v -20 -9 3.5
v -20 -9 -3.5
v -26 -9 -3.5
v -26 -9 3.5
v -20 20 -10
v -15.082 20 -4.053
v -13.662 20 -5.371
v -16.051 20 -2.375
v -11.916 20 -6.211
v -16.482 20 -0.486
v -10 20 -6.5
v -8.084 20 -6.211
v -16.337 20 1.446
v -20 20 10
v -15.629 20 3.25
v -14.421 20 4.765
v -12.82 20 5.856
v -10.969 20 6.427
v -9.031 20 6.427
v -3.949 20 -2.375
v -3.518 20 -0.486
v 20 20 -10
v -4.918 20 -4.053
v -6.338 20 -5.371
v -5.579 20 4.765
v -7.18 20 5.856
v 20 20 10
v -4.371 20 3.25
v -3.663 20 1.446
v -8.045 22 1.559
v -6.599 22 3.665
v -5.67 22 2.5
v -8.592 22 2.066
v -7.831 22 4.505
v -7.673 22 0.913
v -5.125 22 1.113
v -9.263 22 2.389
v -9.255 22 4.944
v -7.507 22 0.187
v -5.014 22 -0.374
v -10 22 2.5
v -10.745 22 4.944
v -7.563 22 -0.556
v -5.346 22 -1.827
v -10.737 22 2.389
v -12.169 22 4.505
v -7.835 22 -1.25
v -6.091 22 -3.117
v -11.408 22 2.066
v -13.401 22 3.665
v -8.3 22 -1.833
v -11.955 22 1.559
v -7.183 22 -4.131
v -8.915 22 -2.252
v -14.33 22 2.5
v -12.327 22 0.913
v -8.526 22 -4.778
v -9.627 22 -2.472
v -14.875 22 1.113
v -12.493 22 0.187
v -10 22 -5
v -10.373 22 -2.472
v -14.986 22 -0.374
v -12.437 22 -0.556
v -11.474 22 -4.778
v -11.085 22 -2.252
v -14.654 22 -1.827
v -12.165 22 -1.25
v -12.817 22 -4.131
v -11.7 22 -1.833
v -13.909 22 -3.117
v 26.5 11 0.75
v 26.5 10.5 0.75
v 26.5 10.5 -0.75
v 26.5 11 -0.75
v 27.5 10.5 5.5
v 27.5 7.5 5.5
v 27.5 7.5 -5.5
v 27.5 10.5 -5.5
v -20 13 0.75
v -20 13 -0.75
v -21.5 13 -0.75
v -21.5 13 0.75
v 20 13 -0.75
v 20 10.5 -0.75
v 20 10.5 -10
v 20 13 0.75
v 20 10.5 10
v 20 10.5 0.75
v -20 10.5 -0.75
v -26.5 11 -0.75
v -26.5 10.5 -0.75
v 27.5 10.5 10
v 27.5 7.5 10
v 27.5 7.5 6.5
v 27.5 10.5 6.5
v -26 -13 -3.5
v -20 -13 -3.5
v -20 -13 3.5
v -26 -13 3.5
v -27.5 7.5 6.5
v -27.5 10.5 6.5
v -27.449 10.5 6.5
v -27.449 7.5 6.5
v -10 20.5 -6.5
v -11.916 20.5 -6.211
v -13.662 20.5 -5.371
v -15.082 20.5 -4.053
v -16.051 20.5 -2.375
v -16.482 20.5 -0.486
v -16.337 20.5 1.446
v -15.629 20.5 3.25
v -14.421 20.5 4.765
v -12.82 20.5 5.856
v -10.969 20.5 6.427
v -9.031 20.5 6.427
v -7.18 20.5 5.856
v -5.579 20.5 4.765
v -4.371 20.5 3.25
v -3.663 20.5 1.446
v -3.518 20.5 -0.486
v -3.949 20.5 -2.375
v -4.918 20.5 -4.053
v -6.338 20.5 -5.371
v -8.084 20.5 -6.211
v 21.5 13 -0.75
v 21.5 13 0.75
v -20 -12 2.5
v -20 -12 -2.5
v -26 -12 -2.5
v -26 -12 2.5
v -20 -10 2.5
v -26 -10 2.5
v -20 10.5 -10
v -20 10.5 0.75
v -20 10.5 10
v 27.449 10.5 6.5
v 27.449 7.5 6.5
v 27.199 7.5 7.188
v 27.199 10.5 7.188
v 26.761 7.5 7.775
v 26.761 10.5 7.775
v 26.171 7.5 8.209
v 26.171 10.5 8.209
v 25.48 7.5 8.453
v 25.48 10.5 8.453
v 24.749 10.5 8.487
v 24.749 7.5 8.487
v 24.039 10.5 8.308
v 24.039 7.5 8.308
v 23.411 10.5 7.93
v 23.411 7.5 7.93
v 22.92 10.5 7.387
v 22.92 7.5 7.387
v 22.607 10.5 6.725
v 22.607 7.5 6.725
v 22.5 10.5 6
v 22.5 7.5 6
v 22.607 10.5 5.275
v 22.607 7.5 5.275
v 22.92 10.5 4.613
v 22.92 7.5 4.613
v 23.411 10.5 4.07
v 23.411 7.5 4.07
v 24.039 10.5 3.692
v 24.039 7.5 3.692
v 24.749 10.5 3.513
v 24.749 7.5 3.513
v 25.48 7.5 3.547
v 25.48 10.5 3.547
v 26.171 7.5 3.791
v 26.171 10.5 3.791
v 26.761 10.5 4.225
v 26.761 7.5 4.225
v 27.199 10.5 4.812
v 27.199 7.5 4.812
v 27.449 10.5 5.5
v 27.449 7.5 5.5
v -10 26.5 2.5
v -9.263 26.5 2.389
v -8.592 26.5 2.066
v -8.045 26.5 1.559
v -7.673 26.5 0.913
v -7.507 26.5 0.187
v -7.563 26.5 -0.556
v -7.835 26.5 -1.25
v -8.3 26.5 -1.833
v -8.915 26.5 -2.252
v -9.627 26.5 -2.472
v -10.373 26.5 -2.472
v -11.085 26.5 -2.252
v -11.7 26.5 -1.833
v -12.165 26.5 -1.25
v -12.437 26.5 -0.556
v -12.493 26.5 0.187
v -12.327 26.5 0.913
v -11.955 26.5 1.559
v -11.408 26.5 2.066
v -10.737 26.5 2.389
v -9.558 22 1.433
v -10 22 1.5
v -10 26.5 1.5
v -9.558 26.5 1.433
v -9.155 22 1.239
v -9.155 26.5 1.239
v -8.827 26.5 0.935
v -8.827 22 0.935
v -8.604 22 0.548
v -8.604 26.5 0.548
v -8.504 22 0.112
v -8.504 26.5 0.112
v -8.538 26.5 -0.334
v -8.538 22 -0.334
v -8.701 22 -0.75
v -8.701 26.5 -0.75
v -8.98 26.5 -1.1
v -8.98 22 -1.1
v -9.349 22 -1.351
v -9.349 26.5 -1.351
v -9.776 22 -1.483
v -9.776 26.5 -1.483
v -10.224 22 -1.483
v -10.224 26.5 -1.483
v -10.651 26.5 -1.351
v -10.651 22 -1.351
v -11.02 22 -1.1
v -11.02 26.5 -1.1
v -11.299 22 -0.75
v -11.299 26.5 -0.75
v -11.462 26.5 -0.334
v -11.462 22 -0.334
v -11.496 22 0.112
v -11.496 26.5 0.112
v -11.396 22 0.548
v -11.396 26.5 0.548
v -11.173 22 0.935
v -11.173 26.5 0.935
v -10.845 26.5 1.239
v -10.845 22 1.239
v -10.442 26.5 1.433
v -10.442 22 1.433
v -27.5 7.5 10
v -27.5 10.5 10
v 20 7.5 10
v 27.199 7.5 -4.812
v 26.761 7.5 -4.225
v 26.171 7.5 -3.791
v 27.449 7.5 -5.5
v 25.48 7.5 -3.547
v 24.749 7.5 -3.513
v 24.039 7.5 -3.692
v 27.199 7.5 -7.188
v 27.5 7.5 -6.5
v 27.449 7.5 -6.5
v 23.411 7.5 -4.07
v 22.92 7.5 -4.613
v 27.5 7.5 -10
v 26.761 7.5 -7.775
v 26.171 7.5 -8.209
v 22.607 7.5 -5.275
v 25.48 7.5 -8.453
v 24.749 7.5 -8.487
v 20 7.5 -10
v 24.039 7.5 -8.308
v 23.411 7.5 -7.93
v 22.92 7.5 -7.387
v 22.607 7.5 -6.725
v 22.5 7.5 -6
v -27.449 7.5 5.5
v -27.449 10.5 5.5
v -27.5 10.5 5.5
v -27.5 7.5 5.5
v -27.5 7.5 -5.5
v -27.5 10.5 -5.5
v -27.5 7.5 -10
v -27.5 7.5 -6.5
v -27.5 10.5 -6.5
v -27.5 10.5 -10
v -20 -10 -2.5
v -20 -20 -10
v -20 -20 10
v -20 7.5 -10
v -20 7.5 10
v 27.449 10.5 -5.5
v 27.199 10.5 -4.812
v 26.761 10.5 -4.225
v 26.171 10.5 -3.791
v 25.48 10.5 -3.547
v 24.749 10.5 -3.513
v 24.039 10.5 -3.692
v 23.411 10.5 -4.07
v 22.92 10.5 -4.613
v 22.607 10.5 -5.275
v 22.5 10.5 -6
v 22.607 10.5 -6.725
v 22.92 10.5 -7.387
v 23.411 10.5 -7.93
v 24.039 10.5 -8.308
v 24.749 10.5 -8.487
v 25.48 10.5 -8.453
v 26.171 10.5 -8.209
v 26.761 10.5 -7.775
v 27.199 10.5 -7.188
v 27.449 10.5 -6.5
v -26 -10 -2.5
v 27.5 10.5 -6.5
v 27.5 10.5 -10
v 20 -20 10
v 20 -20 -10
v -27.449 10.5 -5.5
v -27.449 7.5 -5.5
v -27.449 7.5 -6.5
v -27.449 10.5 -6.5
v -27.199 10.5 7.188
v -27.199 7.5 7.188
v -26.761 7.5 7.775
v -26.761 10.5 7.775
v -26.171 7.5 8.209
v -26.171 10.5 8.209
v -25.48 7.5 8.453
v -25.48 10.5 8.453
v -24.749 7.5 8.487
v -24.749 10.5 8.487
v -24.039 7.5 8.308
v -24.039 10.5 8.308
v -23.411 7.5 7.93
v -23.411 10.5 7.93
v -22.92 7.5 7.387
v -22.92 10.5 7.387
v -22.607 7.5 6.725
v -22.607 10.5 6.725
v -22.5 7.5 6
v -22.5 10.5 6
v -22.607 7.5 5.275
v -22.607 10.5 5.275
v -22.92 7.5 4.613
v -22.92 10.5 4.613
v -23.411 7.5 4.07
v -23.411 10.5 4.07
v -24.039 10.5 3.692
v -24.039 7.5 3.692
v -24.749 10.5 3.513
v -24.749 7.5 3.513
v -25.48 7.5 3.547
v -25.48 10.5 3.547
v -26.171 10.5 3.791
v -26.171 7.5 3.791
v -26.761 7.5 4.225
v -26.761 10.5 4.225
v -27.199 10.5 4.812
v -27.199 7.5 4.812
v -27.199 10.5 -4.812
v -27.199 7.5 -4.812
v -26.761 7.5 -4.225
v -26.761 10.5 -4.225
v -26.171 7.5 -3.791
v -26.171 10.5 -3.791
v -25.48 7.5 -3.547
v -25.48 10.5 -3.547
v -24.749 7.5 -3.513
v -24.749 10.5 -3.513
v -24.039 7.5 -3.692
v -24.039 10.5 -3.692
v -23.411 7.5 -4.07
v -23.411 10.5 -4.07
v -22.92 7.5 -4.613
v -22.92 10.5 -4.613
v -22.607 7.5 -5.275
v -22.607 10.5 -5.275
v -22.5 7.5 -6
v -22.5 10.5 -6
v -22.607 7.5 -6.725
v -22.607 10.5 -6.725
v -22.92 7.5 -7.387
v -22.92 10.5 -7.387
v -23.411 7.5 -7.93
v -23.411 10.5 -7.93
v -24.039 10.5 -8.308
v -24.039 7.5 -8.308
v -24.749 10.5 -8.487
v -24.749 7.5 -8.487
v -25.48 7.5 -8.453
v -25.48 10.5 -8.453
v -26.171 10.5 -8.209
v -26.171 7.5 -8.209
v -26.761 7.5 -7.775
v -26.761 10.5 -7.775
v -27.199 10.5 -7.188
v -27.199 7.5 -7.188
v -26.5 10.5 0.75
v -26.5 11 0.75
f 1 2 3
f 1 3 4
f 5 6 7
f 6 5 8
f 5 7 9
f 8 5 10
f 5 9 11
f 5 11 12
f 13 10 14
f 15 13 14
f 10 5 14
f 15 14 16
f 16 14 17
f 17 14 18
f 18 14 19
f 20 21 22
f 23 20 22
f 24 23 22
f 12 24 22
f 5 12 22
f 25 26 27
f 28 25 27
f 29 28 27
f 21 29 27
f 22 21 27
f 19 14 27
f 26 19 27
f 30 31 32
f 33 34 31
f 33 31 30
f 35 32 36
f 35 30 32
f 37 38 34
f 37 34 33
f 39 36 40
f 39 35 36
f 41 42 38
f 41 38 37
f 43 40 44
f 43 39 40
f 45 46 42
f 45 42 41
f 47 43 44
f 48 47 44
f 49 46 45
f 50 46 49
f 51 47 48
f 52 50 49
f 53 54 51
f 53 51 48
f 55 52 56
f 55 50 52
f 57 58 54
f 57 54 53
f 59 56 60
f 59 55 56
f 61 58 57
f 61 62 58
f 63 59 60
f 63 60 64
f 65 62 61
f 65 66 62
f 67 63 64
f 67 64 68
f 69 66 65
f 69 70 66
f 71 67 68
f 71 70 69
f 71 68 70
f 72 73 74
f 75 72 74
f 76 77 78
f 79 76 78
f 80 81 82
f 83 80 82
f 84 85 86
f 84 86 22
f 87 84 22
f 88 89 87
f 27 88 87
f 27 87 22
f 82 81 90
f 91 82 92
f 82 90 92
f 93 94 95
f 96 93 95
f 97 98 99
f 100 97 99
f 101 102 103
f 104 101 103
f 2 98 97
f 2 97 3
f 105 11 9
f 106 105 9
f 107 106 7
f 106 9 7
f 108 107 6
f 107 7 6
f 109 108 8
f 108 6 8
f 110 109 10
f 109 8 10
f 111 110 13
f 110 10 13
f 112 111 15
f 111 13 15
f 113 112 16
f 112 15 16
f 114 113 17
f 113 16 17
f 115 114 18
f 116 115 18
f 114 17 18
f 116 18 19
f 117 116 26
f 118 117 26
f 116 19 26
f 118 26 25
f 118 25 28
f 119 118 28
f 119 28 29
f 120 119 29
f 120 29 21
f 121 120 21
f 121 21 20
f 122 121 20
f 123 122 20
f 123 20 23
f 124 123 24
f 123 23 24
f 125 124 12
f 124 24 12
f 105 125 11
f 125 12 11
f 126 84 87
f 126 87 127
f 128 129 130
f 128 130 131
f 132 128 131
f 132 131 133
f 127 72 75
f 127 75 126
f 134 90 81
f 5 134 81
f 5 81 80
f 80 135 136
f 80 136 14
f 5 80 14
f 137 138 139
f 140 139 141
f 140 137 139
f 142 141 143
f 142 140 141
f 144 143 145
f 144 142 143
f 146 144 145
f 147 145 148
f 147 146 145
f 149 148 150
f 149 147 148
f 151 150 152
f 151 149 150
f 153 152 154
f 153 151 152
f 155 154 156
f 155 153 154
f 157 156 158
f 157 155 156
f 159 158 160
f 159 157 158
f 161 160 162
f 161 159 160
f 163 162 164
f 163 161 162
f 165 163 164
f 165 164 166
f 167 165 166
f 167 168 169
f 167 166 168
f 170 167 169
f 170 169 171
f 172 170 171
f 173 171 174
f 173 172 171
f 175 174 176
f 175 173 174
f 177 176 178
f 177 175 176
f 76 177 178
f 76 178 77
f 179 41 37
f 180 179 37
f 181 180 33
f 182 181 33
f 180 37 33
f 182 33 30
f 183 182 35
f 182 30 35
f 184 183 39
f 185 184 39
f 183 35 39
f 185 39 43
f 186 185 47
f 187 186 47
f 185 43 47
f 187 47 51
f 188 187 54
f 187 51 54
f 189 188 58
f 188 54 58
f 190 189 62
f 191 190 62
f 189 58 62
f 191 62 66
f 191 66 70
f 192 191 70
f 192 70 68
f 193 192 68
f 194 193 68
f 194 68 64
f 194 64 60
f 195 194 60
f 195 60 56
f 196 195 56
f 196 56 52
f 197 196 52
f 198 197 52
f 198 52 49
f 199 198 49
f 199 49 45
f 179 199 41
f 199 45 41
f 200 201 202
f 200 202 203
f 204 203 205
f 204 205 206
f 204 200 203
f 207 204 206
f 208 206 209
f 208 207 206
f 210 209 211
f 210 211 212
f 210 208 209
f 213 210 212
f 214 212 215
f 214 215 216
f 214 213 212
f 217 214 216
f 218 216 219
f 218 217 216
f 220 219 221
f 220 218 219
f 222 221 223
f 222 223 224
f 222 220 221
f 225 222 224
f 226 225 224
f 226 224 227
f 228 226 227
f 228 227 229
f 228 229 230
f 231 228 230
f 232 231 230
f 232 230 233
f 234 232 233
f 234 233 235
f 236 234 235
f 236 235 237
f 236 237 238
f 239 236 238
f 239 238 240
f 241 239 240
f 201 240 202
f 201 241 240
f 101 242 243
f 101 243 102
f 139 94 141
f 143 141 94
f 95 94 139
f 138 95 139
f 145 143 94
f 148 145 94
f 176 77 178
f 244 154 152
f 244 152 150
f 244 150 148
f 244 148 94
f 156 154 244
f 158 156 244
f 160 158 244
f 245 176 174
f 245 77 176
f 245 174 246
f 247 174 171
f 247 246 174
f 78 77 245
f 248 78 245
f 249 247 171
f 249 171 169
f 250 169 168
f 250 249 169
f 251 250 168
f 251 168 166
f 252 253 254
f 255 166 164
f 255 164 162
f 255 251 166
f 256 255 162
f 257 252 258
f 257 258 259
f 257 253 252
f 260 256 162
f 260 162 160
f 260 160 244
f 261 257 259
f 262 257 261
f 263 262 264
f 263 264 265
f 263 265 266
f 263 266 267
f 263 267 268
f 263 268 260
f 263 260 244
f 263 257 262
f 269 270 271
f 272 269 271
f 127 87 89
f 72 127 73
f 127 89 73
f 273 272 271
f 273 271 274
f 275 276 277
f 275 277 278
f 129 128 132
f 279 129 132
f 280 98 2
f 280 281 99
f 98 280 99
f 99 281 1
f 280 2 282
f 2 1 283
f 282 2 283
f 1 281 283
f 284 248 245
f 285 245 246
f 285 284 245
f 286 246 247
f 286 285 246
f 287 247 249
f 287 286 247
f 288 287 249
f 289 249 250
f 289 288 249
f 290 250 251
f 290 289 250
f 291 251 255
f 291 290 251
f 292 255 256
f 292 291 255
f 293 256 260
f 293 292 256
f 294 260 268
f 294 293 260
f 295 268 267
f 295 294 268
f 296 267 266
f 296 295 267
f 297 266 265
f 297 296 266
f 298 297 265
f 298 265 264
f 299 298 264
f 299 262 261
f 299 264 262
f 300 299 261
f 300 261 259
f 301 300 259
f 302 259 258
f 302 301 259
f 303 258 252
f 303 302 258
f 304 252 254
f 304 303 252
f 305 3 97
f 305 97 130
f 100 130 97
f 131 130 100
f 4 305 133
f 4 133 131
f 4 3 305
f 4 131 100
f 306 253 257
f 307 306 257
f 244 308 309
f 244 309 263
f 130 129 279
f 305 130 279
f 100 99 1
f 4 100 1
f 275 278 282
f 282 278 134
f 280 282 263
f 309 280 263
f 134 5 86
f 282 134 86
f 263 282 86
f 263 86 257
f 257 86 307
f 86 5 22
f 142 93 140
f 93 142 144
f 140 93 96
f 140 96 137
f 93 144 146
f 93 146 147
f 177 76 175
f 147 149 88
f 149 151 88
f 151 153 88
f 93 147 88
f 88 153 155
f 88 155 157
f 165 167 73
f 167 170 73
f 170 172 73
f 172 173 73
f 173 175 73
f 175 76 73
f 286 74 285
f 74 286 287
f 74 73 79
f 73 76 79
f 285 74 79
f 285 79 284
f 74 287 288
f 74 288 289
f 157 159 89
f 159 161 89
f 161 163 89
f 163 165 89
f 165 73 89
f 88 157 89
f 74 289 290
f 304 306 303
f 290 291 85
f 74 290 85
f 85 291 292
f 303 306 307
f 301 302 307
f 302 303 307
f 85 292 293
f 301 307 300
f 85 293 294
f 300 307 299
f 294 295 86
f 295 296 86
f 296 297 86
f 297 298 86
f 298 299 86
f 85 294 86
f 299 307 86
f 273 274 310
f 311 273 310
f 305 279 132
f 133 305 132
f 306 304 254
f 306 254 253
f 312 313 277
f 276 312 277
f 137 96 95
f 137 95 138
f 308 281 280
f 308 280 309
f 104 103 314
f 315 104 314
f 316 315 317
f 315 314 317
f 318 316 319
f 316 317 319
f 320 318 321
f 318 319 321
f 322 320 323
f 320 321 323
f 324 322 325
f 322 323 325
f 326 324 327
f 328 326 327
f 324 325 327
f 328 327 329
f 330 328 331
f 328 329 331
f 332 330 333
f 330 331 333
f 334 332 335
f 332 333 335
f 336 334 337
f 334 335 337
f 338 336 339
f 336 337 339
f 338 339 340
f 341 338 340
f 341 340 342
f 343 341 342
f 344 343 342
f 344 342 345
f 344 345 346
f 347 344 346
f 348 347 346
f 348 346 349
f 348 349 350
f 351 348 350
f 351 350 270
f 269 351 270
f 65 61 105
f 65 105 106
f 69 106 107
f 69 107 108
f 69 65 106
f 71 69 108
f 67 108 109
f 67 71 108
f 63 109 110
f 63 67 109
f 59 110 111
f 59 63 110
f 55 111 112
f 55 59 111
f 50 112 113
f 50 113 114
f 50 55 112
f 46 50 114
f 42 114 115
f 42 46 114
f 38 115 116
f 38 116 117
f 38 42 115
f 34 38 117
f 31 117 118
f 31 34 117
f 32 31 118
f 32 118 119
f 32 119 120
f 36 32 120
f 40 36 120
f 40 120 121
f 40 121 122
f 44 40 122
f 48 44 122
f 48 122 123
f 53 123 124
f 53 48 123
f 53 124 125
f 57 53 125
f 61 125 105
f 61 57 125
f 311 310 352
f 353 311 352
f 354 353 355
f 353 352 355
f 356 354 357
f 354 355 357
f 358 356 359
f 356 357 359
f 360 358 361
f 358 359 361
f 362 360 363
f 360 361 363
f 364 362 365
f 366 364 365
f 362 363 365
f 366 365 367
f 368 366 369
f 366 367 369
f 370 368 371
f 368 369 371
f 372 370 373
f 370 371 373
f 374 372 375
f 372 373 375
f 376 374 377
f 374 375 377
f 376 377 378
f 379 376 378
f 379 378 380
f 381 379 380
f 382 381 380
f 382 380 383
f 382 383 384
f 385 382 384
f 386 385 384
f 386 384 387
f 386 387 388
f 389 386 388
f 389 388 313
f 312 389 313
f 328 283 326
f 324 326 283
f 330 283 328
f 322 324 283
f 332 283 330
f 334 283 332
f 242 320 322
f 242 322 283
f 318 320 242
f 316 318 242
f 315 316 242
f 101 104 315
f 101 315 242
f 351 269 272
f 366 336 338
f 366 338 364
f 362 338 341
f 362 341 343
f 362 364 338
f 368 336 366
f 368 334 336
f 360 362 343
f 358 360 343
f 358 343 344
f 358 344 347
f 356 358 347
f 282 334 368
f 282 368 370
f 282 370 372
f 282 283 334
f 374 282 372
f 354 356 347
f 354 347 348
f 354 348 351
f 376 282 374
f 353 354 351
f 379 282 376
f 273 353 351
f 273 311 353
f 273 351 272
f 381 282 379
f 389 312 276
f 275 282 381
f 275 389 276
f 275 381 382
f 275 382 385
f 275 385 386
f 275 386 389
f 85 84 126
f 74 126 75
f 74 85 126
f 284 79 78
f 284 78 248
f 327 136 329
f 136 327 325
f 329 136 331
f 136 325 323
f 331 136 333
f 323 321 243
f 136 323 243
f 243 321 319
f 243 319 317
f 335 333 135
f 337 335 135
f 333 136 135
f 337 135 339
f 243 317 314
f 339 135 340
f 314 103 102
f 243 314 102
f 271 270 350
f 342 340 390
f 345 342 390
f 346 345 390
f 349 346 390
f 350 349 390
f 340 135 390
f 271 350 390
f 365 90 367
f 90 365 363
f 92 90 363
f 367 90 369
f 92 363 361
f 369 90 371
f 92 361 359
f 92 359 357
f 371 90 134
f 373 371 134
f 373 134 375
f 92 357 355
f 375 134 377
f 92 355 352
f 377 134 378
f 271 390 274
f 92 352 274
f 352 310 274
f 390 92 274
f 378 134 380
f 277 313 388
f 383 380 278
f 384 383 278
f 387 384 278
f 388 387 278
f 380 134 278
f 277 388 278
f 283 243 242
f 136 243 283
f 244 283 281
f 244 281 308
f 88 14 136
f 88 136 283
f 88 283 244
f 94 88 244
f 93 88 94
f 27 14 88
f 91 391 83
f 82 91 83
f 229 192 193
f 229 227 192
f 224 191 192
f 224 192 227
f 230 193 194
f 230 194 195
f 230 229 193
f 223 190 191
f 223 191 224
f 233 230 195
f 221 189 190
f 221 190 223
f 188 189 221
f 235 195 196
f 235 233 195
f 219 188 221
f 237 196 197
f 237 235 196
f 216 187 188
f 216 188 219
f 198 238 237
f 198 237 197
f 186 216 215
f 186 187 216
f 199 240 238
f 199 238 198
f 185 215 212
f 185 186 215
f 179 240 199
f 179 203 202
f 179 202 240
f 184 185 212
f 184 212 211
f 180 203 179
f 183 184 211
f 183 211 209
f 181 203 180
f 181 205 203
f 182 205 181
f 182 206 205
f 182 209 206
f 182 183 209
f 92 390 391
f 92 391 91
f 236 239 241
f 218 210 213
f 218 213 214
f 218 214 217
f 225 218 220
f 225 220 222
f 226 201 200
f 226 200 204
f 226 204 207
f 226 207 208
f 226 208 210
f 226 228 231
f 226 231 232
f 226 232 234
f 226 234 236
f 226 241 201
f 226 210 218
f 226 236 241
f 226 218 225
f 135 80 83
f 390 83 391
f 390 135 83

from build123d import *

# Parameters (mm, degrees)
SKETCH1_W           = 40
SKETCH1_H           = 40
BOSS_EXTRUDE1_DEPTH = 10
SKETCH2_R           = 6.5
BOSS_EXTRUDE2_DEPTH = 2
SKETCH3_W           = 7.5
SKETCH3_H           = 20
BOSS_EXTRUDE3_DEPTH = 3
SKETCH4_W           = 6.5
SKETCH4_H           = 1.5
BOSS_EXTRUDE4_DEPTH = 2.5
CUT_EXTRUDE1_DEPTH  = 2.5
CUT_EXTRUDE6_DEPTH  = 12.5
CHAMFER1_SIZE       = 1.5
SKETCH8_W           = 7
SKETCH8_H           = 4
SKETCH8_W_2         = 5
SKETCH8_H_2         = 2
BOSS_EXTRUDE6_DEPTH = 6
SKETCH7_R           = 2.5
SKETCH7_R_2         = 1.5
BOSS_EXTRUDE7_DEPTH = 4.5


with BuildPart() as part:
    # Sketch1 → Boss-Extrude1 (new, symmetric)
    with BuildSketch(Plane.XY):
        Rectangle(SKETCH1_W, SKETCH1_H)
    extrude(amount=BOSS_EXTRUDE1_DEPTH, both=True)

    # Sketch2 → Boss-Extrude2 (add)
    with BuildSketch(Plane(origin=(0, 20, 0), x_dir=(1, 0, 0), z_dir=(0, 1, 0))):
        with Locations(Location((-10, 0, 0), (0, 0, 90))):
            Circle(SKETCH2_R)
    extrude(amount=BOSS_EXTRUDE2_DEPTH)

    # Sketch3 → Boss-Extrude3 (add)
    with BuildSketch(Plane(origin=(0, 7.5, 0), x_dir=(-1, 0, 0), z_dir=(0, -1, 0))):
        with Locations((23.75, 0)):
            Rectangle(SKETCH3_W, SKETCH3_H)
        with Locations((-23.75, 0)):
            Rectangle(SKETCH3_W, SKETCH3_H)
    extrude(amount=-BOSS_EXTRUDE3_DEPTH)

    # Sketch4 → Boss-Extrude4 (add)
    with BuildSketch(Plane(origin=(0, 10.5, 0), x_dir=(1, 0, 0), z_dir=(0, 1, 0))):
        with Locations((23.25, 0)):
            Rectangle(SKETCH4_W, SKETCH4_H)
    boss_extrude4 = extrude(amount=BOSS_EXTRUDE4_DEPTH)

    # Sketch5 → Cut-Extrude1 (cut)
    with BuildSketch(Plane.XY.offset(0.75)):
        Polygon((26.5, 11), (21.5, 13), (26.5, 13), align=None)
    cut_extrude1 = extrude(amount=-CUT_EXTRUDE1_DEPTH, mode=Mode.SUBTRACT)

    # Sketch6 → Cut-Extrude6 (cut)
    with BuildSketch(Plane(origin=(0, 10.5, 0), x_dir=(1, 0, 0), z_dir=(0, 1, 0))):
        with BuildLine():
            Line((-27.449489743, 6.5), (-27.5, 6.5))
            Line((-27.5, 6.5), (-27.5, 5.5))
            Line((-27.5, 5.5), (-27.449489743, 5.5))
            ThreePointArc((-27.449489743, 5.5), (-22.5, 6), (-27.449489743, 6.5))
        make_face()
        with BuildLine():
            Line((-27.449489743, -5.5), (-27.5, -5.5))
            Line((-27.5, -5.5), (-27.5, -6.5))
            Line((-27.5, -6.5), (-27.449489743, -6.5))
            ThreePointArc((-27.449489743, -6.5), (-22.5, -6), (-27.449489743, -5.5))
        make_face()
    cut_extrude6 = extrude(amount=-CUT_EXTRUDE6_DEPTH, mode=Mode.SUBTRACT)

    # Mirror1: Boss-Extrude4, Cut-Extrude1, Cut-Extrude6 across plane
    add(boss_extrude4.mirror(Plane(origin=(0, 0, 0), x_dir=(0, 0, 1), z_dir=(1, 0, 0))))
    add(cut_extrude1.mirror(Plane(origin=(0, 0, 0), x_dir=(0, 0, 1), z_dir=(1, 0, 0))), mode=Mode.SUBTRACT)
    add(cut_extrude6.mirror(Plane(origin=(0, 0, 0), x_dir=(0, 0, 1), z_dir=(1, 0, 0))), mode=Mode.SUBTRACT)

    # Chamfer1
    chamfer1_edges = [part.edges().sort_by_distance(p)[0] for p in [
        (-10, 22, 6.5),
    ]]
    chamfer(chamfer1_edges, length=CHAMFER1_SIZE)

    # Sketch8 → Boss-Extrude6 (add)
    with BuildSketch(Plane.ZY.offset(20)):
        with Locations((0, -11)):
            Rectangle(SKETCH8_W, SKETCH8_H)
        with Locations((0, -11)):
            Rectangle(SKETCH8_W_2, SKETCH8_H_2, mode=Mode.SUBTRACT)
    extrude(amount=BOSS_EXTRUDE6_DEPTH)

    # Sketch7 → Boss-Extrude7 (add)
    with BuildSketch(Plane(origin=(0, 22, 0), x_dir=(1, 0, 0), z_dir=(0, 1, 0))):
        with Locations(Location((-10, 0, 0), (0, 0, 270))):
            Circle(SKETCH7_R)
        with Locations(Location((-10, 0, 0), (0, 0, 270))):
            Circle(SKETCH7_R_2, mode=Mode.SUBTRACT)
    extrude(amount=BOSS_EXTRUDE7_DEPTH)


solid = part.part
